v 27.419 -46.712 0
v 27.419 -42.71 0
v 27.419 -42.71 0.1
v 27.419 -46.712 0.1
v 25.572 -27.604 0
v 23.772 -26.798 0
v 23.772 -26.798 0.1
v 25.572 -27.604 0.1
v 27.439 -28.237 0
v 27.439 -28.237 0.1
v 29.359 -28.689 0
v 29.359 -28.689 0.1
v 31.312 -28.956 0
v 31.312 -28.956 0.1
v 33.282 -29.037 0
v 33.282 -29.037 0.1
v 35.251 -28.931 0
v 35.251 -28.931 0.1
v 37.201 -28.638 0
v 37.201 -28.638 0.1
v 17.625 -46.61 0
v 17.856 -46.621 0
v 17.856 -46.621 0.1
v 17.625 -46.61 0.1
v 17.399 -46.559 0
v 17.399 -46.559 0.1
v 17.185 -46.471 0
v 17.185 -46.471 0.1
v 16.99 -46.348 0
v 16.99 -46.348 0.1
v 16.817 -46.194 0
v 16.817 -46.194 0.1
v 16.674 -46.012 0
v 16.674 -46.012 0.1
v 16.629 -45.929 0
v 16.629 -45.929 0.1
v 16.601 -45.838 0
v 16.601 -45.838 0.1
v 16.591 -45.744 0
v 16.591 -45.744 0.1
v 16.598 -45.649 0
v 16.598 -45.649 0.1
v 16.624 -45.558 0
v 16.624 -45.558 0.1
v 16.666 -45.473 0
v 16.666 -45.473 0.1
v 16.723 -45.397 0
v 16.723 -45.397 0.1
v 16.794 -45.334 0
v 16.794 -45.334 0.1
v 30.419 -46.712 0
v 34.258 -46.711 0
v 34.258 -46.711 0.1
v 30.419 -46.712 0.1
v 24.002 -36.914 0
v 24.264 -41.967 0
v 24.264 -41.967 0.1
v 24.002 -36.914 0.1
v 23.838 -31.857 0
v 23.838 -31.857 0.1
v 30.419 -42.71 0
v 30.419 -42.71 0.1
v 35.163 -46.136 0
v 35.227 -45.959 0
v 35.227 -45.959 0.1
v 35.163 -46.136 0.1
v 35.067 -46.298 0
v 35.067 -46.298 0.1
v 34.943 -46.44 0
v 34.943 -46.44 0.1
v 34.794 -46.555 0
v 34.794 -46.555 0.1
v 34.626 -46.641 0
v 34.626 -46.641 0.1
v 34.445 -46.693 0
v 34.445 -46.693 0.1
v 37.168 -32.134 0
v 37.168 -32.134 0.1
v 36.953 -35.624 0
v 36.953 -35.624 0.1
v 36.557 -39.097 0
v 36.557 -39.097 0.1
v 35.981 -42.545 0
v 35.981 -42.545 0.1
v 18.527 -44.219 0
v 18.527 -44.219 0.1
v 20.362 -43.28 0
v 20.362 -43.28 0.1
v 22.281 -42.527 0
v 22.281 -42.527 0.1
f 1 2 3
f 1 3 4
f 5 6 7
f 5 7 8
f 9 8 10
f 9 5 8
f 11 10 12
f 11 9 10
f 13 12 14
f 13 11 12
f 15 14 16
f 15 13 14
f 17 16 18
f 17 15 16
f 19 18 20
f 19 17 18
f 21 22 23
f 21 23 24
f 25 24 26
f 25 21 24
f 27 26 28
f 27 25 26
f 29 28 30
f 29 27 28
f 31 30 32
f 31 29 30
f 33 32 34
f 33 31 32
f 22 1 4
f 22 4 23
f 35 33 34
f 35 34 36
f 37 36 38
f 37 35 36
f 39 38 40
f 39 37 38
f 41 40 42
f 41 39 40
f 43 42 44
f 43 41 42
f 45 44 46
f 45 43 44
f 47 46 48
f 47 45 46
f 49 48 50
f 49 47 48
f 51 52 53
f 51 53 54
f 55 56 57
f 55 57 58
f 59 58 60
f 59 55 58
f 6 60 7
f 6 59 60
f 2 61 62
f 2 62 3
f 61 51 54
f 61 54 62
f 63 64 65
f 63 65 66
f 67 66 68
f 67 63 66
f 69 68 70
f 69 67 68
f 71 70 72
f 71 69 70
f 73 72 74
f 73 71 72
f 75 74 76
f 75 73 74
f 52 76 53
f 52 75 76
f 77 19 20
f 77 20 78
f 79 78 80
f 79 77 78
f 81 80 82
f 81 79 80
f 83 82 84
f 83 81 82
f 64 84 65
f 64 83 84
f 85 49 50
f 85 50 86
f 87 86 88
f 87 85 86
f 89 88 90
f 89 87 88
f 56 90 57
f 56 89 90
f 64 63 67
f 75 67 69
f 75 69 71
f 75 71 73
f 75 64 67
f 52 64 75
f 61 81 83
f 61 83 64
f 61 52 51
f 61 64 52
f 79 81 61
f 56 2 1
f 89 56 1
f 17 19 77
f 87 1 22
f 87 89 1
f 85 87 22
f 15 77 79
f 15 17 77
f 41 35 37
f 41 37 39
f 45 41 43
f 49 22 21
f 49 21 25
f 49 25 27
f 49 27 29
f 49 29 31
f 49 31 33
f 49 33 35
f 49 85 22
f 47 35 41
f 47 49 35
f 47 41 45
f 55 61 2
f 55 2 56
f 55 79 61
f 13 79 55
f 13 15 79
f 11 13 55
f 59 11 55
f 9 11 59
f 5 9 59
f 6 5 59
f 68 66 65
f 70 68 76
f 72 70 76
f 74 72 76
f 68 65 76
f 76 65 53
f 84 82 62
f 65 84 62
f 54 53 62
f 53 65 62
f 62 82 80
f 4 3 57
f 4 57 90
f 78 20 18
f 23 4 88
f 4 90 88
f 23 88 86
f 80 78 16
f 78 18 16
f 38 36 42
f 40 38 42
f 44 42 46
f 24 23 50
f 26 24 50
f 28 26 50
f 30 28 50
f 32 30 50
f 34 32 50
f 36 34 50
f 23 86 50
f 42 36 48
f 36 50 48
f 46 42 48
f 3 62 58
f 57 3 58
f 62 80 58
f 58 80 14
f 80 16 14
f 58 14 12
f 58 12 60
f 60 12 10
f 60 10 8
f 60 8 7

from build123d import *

# Parameters (mm, degrees)
SALIENTE_EXTRUIR1_DEPTH = 0.1


with BuildPart() as part:
    # Model → Saliente-Extruir1 (new body)
    with BuildSketch(Plane.XY):
        with BuildLine():
            Line((27.419125066, -46.711901605), (17.855705746, -46.621328457))
            ThreePointArc((17.855705746, -46.621328457), (17.185424798, -46.47100647), (16.673913765, -46.012498333))
            ThreePointArc((16.673913765, -46.012498333), (16.598467504, -45.649222161), (16.794123037, -45.333975231))
            ThreePointArc((16.794123037, -45.333975231), (20.362195737, -43.279741776), (24.264393991, -41.966780746))
            ThreePointArc((24.264393991, -41.966780746), (23.908199582, -34.385858307), (23.772490147, -26.797785927))
            ThreePointArc((23.772490147, -26.797785927), (30.332057529, -28.845679283), (37.200740842, -28.638360736))
            ThreePointArc((37.200740842, -28.638360736), (36.777649791, -37.362977687), (35.226615012, -45.959037138))
            ThreePointArc((35.226615012, -45.959037138), (34.871092661, -46.500894758), (34.258012391, -46.710986181))
            Line((34.258012391, -46.710986181), (30.419140985, -46.711540389))
            Line((30.419140985, -46.711540389), (30.419140797, -42.710240543))
            Line((30.419140797, -42.710240543), (27.419140797, -42.710240543))
            Line((27.419140797, -42.710240543), (27.419125066, -46.711901605))
        make_face()
    extrude(amount=SALIENTE_EXTRUIR1_DEPTH)


solid = part.part
